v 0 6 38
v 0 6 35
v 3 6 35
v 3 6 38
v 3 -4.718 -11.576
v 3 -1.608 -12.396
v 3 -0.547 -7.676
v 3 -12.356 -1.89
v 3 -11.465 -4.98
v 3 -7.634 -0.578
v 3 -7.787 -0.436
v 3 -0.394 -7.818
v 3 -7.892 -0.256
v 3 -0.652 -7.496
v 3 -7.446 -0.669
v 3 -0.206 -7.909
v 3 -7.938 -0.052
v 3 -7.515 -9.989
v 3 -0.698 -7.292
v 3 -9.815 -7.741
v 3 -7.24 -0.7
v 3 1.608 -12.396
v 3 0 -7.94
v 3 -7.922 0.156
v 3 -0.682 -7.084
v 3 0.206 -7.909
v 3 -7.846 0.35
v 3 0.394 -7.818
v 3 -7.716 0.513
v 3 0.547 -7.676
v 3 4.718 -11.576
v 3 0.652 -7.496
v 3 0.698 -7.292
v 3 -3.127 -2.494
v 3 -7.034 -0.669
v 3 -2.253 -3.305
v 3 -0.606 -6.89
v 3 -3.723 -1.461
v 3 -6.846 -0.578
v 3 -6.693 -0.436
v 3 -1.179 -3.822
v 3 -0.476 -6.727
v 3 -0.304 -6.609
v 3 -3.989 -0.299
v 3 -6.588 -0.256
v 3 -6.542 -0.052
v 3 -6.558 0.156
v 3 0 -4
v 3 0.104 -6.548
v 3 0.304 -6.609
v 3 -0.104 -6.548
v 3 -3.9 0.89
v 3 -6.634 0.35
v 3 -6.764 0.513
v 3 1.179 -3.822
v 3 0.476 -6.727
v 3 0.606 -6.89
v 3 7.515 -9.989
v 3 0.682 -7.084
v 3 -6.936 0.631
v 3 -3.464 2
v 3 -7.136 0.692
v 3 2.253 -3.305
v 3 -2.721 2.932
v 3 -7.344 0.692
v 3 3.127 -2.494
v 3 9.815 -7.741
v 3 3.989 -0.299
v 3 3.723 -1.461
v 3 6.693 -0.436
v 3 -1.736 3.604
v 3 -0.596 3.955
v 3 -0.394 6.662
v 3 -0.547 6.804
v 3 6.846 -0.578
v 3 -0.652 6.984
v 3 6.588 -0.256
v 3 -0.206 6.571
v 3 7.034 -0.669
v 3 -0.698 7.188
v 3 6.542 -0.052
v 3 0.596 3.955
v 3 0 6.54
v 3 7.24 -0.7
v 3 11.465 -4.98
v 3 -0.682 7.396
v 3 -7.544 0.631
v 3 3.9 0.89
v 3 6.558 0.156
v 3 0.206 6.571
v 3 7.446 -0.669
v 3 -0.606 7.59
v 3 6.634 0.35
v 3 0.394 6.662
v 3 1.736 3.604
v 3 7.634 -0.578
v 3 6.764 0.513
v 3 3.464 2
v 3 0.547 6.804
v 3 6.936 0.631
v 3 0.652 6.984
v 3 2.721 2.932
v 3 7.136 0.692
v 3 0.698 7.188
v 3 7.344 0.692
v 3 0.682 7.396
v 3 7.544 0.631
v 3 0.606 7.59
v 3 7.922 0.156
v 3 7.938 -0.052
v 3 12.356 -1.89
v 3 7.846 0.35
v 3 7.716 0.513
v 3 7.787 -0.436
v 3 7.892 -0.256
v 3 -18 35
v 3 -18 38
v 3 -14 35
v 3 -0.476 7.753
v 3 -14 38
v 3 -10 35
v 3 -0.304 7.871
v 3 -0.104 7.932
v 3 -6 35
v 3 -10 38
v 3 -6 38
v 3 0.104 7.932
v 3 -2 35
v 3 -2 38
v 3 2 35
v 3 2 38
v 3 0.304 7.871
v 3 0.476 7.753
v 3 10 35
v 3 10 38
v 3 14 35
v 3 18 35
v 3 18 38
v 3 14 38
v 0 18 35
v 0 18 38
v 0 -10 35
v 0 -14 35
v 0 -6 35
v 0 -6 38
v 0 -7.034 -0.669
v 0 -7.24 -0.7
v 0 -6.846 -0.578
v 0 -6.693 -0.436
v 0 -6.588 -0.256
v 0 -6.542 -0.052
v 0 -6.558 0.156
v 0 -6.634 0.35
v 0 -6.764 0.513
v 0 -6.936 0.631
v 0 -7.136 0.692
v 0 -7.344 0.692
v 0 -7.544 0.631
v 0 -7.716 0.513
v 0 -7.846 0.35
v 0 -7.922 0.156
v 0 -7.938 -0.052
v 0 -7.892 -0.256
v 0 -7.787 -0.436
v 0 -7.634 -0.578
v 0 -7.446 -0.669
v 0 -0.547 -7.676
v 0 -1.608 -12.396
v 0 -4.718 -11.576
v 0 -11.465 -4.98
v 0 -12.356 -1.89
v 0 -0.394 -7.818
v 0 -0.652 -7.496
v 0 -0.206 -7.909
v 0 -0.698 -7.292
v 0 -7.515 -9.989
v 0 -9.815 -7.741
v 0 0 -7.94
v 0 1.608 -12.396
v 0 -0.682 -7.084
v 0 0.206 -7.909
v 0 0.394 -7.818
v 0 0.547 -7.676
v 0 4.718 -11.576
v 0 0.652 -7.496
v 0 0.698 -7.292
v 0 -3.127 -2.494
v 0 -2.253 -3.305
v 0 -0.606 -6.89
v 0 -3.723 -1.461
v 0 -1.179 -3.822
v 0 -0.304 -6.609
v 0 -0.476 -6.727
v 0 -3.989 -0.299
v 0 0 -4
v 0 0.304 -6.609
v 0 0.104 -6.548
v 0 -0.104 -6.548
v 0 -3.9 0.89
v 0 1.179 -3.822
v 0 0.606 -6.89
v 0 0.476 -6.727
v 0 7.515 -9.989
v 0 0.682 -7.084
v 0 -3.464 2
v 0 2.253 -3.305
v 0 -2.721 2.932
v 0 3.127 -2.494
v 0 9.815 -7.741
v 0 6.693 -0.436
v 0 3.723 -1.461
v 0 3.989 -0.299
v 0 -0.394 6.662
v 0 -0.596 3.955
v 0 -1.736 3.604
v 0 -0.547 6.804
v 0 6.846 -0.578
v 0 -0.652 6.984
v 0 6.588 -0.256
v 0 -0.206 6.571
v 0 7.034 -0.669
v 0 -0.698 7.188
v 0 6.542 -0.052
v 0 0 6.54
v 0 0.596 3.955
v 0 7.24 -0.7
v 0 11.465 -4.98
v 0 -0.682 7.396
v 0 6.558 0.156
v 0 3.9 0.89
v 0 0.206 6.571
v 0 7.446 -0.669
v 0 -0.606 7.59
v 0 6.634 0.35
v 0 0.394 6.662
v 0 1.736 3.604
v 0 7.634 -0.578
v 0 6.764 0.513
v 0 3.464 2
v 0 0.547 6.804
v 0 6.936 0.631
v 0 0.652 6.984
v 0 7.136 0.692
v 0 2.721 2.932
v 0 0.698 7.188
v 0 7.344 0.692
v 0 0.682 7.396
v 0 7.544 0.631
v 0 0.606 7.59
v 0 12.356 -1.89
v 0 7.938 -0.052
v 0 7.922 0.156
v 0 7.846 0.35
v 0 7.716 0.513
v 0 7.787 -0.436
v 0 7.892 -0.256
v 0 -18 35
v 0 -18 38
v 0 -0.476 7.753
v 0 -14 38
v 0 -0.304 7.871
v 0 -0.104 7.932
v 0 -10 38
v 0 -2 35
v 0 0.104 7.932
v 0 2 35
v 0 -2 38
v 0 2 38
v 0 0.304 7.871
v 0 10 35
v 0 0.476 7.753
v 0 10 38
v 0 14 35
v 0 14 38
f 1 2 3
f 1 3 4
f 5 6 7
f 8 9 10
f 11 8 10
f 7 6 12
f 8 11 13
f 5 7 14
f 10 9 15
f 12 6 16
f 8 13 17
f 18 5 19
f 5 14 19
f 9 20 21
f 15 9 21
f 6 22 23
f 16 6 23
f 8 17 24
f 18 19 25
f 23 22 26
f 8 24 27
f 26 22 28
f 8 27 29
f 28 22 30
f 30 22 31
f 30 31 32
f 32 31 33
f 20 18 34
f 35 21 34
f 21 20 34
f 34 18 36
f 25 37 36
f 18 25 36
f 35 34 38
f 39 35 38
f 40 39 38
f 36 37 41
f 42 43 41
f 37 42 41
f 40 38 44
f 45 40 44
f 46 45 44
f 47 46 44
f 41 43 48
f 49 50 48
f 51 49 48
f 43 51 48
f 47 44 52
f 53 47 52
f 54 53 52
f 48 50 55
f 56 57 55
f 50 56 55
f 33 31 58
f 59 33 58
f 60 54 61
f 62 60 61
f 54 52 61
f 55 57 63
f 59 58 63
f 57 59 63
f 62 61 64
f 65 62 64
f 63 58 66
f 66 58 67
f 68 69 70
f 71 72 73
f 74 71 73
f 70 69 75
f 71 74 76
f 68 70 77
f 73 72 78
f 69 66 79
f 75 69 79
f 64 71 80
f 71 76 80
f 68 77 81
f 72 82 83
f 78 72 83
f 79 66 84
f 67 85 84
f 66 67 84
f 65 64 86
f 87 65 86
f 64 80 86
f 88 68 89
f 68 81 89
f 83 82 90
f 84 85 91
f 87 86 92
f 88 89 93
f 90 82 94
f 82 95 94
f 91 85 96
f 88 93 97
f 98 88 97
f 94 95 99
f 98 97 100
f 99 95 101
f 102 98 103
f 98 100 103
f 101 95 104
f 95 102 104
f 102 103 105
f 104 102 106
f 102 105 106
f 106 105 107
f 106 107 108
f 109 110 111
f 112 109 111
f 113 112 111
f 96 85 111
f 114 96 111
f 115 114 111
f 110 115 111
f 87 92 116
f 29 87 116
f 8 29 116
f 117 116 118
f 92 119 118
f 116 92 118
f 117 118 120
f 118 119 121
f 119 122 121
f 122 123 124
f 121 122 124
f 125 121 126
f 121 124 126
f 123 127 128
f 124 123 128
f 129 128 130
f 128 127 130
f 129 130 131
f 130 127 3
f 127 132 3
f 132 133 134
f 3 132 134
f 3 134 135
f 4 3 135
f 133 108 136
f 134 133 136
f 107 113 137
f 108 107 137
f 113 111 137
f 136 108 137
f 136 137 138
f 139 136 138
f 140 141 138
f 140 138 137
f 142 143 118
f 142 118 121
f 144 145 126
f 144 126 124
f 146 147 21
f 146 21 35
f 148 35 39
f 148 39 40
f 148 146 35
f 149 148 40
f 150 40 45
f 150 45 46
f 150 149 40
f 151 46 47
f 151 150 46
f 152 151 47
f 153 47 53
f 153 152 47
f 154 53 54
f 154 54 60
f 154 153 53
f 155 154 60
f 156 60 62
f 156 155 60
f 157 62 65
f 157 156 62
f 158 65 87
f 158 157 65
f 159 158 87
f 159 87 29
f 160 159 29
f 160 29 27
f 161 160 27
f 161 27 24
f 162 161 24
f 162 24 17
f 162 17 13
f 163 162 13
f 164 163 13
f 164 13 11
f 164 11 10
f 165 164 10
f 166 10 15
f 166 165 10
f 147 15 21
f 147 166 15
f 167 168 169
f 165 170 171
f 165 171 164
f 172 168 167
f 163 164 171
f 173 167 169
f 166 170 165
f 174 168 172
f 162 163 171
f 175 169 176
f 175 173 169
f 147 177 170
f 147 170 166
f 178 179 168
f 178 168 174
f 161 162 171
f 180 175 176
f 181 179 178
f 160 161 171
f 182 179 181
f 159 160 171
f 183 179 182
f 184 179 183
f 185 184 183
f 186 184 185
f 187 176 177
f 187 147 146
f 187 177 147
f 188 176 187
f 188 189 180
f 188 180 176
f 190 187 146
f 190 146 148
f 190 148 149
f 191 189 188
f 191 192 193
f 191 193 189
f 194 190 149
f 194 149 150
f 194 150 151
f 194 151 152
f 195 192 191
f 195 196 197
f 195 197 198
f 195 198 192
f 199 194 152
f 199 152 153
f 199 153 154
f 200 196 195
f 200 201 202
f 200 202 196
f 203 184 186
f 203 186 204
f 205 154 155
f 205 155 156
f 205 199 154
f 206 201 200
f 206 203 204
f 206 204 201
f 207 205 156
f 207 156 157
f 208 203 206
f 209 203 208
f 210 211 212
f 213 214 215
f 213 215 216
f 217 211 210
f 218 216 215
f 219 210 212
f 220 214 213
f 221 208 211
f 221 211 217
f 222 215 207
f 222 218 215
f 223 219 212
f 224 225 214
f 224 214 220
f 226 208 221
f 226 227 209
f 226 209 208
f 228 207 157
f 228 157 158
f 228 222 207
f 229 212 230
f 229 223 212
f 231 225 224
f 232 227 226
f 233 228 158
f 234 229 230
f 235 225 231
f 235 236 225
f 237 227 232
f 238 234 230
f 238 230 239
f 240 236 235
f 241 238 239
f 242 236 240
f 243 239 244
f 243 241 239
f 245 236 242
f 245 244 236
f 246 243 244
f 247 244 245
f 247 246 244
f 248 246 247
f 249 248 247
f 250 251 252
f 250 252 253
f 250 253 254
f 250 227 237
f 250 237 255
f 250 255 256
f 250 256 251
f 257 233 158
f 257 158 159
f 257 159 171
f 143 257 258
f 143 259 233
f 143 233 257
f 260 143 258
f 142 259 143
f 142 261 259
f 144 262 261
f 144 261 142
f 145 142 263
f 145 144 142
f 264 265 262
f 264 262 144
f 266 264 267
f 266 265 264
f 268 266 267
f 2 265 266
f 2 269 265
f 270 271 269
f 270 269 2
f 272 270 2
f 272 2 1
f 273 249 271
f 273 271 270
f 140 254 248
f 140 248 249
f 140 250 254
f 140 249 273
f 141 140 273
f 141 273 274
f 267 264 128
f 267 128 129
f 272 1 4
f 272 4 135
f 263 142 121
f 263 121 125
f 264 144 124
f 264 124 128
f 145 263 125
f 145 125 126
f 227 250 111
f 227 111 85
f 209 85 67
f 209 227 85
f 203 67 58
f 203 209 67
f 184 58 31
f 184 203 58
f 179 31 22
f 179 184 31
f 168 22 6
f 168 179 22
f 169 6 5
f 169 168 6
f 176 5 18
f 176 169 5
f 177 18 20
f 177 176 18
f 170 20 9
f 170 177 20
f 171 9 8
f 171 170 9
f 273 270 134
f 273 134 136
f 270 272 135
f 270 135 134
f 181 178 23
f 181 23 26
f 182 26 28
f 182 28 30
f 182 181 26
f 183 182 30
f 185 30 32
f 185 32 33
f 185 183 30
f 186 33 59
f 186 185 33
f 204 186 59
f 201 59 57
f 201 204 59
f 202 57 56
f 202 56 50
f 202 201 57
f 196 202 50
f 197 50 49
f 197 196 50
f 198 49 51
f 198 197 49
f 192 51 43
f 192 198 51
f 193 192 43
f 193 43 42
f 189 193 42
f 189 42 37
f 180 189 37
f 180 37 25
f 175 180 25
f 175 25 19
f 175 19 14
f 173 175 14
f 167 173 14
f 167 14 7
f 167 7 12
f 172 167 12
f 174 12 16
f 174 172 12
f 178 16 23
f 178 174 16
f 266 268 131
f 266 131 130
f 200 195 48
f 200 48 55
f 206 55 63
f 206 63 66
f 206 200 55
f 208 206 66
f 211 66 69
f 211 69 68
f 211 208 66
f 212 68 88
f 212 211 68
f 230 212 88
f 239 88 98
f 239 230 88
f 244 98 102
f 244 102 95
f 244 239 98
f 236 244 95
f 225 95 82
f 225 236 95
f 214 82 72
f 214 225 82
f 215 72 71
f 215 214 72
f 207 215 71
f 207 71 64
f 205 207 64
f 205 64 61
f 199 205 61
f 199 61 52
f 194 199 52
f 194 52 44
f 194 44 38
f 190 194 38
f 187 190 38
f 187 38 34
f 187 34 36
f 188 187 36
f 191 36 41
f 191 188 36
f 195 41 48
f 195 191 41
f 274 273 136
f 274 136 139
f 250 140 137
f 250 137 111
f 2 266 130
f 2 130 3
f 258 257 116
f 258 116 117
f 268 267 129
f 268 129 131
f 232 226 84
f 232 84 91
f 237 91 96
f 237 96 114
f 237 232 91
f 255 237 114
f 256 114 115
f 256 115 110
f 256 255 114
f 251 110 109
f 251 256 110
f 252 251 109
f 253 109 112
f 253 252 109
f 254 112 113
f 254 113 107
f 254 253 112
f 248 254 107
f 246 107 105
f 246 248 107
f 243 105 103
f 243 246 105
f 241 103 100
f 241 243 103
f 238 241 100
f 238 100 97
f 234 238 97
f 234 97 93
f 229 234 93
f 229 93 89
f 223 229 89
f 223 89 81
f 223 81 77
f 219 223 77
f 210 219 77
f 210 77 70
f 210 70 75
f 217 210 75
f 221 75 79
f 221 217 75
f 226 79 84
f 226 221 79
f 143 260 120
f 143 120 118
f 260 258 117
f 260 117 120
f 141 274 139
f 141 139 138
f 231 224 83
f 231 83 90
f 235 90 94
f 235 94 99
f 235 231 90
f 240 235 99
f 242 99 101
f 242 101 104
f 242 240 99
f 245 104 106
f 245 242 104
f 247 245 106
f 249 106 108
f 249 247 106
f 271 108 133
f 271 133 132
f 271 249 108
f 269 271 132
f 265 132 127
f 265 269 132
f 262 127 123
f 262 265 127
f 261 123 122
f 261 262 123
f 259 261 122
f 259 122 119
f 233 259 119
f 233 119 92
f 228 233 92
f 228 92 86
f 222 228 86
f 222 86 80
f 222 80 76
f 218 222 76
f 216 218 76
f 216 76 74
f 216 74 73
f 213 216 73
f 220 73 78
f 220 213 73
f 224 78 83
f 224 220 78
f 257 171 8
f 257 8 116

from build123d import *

# Parameters (mm, degrees)
SKETCH1_R           = 4
SKETCH1_R_2         = 0.7
BOSS_EXTRUDE1_DEPTH = 3


with BuildPart() as part:
    # Sketch1 → Boss-Extrude1 (new body)
    with BuildSketch(Plane(origin=(0, 0, 0), x_dir=(0, 0, -1), z_dir=(1, 0, 0))):
        with BuildLine():
            Line((-38, 18), (-35, 18))
            Line((-35, 18), (1.890350117, 12.356236338))
            ThreePointArc((1.890350117, 12.356236338), (12.5, 0), (1.890350117, -12.356236338))
            Line((1.890350117, -12.356236338), (-35, -18))
            Line((-35, -18), (-38, -18))
            Line((-38, -18), (-38, -14))
            Line((-38, -14), (-35, -14))
            Line((-35, -14), (-35, -10))
            Line((-35, -10), (-38, -10))
            Line((-38, -10), (-38, -6))
            Line((-38, -6), (-35, -6))
            Line((-35, -6), (-35, -2))
            Line((-35, -2), (-38, -2))
            Line((-38, -2), (-38, 2))
            Line((-38, 2), (-35, 2))
            Line((-35, 2), (-35, 6))
            Line((-35, 6), (-38, 6))
            Line((-38, 6), (-38, 10))
            Line((-38, 10), (-35, 10))
            Line((-35, 10), (-35, 14))
            Line((-35, 14), (-38, 14))
            Line((-38, 14), (-38, 18))
        make_face()
        Circle(SKETCH1_R, mode=Mode.SUBTRACT)
        with Locations((-7.24, 0)):
            Circle(SKETCH1_R_2, mode=Mode.SUBTRACT)
        with Locations((0, 7.24)):
            Circle(SKETCH1_R_2, mode=Mode.SUBTRACT)
        with Locations((7.24, 0)):
            Circle(SKETCH1_R_2, mode=Mode.SUBTRACT)
        with Locations((0, -7.24)):
            Circle(SKETCH1_R_2, mode=Mode.SUBTRACT)
    extrude(amount=BOSS_EXTRUDE1_DEPTH)


solid = part.part
